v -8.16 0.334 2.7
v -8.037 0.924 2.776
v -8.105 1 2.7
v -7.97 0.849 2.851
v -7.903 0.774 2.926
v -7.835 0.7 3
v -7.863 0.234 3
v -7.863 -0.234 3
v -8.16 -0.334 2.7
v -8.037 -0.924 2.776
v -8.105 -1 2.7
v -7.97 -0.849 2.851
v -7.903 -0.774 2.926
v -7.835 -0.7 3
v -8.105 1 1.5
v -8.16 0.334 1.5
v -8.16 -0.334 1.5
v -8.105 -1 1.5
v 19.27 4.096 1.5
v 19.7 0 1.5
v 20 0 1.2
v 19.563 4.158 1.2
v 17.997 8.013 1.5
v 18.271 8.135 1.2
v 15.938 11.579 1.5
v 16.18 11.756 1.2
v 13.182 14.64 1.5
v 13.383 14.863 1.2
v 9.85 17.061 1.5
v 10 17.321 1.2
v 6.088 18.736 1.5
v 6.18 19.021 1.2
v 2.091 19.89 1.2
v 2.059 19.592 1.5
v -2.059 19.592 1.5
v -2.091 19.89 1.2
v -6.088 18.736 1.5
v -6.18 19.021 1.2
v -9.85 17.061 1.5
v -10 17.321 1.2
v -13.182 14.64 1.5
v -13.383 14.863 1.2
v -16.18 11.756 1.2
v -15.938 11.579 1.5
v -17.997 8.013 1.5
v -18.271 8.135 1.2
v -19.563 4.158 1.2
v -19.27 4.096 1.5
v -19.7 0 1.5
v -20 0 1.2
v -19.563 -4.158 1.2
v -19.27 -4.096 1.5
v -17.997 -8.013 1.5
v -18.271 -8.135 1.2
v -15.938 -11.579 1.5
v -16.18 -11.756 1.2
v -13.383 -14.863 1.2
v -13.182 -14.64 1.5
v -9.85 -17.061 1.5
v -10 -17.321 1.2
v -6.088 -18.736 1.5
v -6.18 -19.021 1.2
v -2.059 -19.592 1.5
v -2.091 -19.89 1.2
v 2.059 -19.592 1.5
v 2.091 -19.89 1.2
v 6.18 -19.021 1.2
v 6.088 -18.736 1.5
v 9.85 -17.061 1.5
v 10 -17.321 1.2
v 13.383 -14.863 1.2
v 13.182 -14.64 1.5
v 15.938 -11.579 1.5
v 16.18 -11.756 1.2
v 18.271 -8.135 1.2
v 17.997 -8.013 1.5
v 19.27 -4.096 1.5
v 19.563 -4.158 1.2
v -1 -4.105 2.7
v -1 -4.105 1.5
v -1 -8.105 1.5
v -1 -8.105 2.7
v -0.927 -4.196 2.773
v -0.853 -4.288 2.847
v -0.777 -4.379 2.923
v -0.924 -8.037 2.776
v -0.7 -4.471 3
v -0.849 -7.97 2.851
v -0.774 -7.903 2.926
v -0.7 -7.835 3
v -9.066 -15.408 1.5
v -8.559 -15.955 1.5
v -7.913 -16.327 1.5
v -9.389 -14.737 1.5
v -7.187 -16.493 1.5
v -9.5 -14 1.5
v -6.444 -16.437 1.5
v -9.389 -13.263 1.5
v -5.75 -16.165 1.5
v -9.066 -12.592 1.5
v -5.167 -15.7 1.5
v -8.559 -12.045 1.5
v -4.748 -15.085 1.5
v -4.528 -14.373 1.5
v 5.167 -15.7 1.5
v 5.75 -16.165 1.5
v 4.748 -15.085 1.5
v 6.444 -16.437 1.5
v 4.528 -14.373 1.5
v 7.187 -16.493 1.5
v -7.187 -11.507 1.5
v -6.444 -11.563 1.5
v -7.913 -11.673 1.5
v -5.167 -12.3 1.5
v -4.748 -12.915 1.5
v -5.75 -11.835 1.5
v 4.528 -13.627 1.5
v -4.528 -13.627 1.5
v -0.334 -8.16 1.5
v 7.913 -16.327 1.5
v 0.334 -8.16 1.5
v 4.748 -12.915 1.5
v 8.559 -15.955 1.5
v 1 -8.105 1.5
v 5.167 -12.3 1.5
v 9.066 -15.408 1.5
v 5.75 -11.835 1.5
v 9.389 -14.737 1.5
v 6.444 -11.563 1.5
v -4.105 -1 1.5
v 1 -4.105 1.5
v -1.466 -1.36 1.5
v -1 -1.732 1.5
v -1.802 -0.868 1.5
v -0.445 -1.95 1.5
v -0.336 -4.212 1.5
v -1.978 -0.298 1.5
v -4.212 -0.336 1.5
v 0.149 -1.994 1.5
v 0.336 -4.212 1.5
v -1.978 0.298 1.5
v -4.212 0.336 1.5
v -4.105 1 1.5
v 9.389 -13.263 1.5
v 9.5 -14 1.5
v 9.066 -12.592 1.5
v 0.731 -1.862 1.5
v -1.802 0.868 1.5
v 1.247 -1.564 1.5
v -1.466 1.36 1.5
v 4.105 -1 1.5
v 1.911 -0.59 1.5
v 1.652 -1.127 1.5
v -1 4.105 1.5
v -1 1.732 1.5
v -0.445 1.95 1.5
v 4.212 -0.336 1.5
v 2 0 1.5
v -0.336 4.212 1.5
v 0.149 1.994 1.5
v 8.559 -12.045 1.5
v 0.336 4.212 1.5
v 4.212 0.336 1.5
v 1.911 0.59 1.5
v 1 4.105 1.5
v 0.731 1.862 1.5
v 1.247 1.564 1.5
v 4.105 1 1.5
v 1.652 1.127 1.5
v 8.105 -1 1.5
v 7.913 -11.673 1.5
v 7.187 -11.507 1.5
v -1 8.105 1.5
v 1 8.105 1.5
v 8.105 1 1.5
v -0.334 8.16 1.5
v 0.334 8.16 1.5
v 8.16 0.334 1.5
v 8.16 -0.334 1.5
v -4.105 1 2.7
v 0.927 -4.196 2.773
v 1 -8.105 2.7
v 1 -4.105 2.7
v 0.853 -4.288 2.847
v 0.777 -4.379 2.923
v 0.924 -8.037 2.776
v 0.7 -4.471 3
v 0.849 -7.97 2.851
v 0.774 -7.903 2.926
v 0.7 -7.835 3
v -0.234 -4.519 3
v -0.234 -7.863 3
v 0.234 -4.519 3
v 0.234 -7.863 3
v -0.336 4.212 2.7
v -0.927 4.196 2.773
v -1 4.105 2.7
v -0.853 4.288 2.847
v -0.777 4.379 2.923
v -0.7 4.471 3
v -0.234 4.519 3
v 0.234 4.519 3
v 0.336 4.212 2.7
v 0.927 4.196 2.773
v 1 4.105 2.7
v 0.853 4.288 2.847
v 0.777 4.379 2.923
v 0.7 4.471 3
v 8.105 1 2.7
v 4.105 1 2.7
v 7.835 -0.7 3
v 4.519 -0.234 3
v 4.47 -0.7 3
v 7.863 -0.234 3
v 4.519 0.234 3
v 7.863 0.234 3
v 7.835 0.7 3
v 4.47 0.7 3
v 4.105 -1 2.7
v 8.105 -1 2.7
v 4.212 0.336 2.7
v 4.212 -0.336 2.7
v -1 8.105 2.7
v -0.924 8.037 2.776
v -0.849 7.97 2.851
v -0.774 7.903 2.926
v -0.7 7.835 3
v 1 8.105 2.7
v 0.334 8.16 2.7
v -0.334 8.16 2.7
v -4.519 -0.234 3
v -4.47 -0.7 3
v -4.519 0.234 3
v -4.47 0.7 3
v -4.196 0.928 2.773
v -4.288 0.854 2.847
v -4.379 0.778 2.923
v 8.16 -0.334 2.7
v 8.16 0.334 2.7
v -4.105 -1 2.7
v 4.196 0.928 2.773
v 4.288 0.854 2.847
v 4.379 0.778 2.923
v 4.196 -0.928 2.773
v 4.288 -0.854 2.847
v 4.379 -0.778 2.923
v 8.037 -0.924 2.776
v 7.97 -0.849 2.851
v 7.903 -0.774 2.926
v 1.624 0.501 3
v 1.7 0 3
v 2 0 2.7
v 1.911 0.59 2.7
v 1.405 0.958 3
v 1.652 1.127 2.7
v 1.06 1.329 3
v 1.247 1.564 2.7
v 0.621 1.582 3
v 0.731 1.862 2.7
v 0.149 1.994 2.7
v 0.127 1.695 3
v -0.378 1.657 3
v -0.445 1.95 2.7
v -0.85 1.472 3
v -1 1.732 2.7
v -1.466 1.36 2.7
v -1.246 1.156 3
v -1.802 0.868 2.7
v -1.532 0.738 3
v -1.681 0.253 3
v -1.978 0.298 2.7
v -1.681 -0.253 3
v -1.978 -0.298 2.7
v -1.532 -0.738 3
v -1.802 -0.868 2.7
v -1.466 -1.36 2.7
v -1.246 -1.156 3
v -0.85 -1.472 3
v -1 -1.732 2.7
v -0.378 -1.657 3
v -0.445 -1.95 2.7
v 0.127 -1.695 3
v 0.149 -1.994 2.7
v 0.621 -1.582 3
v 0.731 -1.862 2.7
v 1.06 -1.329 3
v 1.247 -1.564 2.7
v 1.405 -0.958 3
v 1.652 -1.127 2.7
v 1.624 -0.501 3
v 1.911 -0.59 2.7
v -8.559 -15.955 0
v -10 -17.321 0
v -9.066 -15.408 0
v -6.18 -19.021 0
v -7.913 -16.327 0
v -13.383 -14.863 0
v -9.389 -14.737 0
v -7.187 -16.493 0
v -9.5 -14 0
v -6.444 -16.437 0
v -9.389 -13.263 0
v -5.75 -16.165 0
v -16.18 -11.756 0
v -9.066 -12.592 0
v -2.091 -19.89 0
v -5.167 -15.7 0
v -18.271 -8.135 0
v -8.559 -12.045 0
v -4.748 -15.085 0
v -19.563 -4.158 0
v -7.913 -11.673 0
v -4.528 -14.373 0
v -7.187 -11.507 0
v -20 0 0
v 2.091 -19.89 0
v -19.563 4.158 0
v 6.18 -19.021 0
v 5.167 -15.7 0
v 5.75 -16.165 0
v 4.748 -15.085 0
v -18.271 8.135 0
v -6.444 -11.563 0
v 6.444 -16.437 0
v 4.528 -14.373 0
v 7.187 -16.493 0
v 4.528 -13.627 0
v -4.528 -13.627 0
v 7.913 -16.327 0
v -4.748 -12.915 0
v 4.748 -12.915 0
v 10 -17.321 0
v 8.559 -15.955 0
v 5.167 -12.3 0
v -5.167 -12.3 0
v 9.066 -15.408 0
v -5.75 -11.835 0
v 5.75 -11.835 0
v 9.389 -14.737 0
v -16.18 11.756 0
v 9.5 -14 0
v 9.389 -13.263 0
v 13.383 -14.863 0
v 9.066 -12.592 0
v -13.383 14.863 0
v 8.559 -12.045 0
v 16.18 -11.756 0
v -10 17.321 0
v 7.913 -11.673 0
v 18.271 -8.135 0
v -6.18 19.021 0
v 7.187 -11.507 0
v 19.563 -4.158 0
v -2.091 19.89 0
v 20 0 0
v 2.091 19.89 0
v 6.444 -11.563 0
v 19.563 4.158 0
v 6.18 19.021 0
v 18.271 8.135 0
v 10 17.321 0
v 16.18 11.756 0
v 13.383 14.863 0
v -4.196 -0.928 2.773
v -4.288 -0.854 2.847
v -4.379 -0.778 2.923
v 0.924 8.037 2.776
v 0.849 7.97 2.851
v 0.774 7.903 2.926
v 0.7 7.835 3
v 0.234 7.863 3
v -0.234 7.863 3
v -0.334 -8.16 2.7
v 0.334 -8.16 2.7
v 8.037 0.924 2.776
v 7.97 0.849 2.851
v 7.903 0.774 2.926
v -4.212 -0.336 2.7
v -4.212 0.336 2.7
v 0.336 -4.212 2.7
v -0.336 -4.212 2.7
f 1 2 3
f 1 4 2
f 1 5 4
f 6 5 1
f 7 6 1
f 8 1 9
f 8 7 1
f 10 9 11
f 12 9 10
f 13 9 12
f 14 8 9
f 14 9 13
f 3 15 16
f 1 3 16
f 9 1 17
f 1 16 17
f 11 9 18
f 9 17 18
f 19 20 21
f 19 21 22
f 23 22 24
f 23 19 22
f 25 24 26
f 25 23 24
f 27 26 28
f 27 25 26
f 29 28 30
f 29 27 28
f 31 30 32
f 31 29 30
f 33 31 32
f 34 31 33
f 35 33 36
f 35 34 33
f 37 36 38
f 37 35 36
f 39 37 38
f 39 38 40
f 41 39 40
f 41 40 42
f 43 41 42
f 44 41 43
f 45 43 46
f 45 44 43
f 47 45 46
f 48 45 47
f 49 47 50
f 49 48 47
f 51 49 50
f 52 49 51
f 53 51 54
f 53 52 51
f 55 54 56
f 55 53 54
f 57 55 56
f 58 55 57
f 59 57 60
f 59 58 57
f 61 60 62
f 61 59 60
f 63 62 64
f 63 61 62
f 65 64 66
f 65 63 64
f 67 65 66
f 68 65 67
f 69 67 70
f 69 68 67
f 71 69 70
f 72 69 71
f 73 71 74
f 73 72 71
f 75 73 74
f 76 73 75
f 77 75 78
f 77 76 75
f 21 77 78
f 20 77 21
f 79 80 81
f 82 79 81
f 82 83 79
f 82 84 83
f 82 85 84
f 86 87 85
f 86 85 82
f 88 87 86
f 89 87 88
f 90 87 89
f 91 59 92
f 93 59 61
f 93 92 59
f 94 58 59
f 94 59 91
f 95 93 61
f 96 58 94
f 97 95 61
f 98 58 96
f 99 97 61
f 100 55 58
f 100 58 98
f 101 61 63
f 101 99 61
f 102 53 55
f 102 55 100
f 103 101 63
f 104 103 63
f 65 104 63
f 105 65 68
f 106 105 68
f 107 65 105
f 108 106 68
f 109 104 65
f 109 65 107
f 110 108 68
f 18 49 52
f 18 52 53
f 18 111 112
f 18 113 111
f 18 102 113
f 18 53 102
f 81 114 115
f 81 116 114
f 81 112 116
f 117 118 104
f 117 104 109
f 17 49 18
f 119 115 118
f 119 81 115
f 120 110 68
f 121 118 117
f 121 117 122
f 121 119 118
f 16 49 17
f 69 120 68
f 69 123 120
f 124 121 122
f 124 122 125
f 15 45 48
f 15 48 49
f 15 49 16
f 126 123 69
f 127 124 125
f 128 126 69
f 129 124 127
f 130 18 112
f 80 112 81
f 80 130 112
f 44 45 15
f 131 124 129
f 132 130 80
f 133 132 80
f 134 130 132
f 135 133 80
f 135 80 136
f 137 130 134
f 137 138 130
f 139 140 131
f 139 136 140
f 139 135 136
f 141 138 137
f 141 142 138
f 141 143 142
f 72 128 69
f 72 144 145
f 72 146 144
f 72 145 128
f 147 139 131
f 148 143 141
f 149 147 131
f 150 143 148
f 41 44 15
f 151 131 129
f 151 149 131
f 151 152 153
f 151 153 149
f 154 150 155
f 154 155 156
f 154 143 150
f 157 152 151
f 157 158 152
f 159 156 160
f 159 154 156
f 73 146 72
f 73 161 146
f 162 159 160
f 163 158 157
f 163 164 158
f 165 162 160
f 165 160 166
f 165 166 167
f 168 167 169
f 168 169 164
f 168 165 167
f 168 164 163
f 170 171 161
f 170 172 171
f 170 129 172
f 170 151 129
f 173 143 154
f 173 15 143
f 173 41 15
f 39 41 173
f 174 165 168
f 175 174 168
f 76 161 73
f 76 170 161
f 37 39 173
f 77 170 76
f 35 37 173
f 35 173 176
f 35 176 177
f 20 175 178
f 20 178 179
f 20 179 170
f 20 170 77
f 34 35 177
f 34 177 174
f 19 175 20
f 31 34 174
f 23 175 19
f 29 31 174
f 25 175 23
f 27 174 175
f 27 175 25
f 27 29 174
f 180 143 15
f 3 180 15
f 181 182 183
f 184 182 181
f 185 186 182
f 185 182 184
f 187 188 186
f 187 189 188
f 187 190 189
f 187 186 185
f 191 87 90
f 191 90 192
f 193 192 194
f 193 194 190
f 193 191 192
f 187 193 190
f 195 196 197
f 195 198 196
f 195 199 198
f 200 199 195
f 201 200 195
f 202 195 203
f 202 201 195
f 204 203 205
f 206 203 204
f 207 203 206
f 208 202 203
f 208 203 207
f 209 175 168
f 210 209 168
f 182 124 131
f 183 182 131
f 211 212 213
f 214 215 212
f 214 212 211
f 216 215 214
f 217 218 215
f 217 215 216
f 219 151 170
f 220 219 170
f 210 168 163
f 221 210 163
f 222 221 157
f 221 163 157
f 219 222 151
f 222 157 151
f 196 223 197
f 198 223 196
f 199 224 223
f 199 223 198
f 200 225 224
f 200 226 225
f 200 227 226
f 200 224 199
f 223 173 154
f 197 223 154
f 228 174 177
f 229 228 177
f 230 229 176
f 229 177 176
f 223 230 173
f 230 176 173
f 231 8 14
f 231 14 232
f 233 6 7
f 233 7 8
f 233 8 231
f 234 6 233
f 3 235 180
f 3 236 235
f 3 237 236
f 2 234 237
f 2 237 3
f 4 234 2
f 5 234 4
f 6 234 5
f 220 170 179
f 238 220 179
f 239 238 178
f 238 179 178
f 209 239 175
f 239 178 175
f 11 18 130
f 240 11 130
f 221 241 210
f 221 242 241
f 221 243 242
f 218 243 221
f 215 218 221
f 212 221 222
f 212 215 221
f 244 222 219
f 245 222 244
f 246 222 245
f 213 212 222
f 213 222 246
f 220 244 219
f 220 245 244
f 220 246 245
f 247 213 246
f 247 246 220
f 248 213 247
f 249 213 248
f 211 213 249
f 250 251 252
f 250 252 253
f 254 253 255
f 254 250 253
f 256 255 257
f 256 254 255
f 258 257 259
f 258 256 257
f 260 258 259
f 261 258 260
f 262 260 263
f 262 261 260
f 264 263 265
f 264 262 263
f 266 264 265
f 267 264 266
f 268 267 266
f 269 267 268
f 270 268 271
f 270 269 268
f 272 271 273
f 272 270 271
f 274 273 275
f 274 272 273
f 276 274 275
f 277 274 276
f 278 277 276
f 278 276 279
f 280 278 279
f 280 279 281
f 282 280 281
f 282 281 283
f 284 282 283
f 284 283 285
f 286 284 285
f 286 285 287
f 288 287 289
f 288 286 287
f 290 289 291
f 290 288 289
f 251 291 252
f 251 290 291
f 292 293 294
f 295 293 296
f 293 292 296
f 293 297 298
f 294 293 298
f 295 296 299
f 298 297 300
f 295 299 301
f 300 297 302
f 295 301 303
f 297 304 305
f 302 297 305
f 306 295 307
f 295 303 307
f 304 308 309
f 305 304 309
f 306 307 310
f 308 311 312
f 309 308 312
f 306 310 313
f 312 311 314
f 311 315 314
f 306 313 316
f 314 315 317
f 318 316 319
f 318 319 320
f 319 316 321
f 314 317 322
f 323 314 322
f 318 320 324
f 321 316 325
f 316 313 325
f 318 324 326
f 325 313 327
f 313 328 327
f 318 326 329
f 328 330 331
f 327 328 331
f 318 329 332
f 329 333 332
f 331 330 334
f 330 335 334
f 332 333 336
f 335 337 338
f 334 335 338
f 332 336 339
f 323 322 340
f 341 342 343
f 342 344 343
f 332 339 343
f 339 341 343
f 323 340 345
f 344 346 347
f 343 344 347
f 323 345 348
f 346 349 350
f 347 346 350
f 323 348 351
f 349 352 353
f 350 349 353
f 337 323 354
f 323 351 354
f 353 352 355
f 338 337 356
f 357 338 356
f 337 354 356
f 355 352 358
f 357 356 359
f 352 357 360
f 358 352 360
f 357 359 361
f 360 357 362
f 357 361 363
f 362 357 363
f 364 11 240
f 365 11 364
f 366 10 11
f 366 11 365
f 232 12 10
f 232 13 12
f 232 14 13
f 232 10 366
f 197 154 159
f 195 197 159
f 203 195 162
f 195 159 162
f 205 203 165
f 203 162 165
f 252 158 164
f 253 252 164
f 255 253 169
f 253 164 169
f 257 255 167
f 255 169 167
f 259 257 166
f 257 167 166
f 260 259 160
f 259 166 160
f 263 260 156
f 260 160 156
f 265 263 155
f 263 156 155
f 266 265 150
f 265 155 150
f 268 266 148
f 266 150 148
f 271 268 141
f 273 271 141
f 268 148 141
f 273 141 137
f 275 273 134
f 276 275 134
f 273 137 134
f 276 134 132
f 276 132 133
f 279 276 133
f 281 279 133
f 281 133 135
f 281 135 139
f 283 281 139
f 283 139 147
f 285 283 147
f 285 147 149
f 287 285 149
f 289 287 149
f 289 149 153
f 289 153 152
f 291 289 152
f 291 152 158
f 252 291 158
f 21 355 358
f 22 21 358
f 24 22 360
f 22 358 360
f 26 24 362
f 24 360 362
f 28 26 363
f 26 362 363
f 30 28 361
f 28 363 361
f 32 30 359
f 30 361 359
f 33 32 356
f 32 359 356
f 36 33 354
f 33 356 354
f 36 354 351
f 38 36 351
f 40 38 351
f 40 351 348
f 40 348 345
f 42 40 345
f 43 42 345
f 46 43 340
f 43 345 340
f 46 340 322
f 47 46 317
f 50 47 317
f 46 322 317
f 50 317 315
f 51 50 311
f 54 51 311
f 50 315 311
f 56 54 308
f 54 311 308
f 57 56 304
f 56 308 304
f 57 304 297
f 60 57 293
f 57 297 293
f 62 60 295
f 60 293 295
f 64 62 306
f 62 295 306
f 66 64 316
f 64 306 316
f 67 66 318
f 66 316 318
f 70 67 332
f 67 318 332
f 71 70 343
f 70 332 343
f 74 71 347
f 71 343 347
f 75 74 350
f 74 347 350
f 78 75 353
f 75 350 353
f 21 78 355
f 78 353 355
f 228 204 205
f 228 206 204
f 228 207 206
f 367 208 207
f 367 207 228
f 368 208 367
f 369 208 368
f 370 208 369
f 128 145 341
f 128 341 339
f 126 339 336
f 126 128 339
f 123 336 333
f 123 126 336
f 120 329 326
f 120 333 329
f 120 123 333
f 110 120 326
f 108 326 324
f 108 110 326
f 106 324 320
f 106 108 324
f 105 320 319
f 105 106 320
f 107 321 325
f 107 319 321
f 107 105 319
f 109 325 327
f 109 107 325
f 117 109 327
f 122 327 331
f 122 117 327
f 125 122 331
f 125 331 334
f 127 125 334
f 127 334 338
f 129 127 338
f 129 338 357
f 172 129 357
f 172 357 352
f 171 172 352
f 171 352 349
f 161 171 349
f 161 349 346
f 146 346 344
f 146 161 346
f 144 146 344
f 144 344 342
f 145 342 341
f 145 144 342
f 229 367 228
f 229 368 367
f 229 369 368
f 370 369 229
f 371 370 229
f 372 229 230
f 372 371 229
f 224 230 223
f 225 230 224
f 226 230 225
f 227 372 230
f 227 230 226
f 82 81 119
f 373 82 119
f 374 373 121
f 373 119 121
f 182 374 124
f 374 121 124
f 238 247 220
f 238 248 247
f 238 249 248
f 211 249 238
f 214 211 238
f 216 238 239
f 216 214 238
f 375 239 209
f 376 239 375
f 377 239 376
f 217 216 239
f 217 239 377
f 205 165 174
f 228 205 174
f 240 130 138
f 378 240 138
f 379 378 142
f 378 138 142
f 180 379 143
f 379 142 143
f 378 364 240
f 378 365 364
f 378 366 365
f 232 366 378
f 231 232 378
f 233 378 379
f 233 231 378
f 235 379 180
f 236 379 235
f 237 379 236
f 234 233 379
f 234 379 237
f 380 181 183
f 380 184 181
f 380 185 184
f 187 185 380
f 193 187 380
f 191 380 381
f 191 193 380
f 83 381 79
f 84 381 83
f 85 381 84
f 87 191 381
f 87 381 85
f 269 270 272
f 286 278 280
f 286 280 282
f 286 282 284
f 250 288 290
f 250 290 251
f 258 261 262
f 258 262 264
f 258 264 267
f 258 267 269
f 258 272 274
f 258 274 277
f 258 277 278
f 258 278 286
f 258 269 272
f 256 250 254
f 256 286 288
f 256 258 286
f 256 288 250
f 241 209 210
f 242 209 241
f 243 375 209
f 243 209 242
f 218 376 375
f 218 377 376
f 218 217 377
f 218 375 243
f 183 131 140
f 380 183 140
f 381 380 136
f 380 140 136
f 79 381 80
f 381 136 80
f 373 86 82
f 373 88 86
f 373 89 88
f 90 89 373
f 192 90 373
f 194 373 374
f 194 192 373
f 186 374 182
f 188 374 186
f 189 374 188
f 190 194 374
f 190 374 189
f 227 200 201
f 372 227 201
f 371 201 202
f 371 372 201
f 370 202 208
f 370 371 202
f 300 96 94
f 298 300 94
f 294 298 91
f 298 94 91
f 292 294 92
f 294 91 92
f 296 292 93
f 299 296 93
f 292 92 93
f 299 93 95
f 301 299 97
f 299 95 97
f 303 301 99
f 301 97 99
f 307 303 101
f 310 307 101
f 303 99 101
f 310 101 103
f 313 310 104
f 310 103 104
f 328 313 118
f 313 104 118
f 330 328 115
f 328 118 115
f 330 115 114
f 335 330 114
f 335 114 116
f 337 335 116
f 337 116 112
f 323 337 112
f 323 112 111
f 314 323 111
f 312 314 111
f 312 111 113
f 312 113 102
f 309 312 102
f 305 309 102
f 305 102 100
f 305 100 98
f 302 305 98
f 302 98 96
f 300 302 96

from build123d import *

# Parameters (mm, degrees)
F0_R     = 20
F1_DEPTH = 1.5
F2_D     = 5
F2_DEPTH = 20.381
F2_TIP   = 1.5021515476
F3_R     = 2
F4_DEPTH = 3
F5_SIZE  = 0.3


# Not quite as in the source:
# - a pattern or mirror of a feature is missing from the dataset's text; its kind, count and spacing are read off the source's solid


with BuildPart() as f1:
    # F0 (on Top) → F1 (new body)
    with BuildSketch(Plane.XY):
        Circle(F0_R)
    extrude(amount=F1_DEPTH)

    # F2
    with Locations(Plane(origin=(0, 0, 0), x_dir=(1, 0, 0), z_dir=(0, 0, -1))):
        with Locations((-7, 14)):
            f2 = Hole(F2_D / 2, depth=F2_DEPTH)
            with Locations((0, 0, -(F2_DEPTH + F2_TIP / 2))):  # 118° drill point
                Cone(0, F2_D / 2, F2_TIP, mode=Mode.SUBTRACT)

    # F2_copies: F2 across plane
    add(f2.mirror(Plane(origin=(0, 0, 0), x_dir=(0, 0, 1), z_dir=(1, 0, 0))), mode=Mode.SUBTRACT)

    # F3 (on Top) → F4 (join)
    with BuildSketch(Plane.XY):
        with BuildLine():
            Line((-4.104842454, 1.0004466142), (-8.104842454, 1.0004466142))
            ThreePointArc((-8.104842454, 1.0004466142), (-8.1663556518, 0), (-8.104842454, -1.0004466142))
            Line((-8.104842454, -1.0004466142), (-4.104842454, -1.0004466142))
            ThreePointArc((-4.104842454, -1.0004466142), (-4.225, 0), (-4.104842454, 1.0004466142))
        make_face()
        with BuildLine():
            ThreePointArc((1, 8.1048975707), (0, 8.1663556518), (-1, 8.1048975707))
            Line((-1, 8.1048975707), (-1, 4.1049512786))
            ThreePointArc((-1, 4.1049512786), (0, 4.225), (1, 4.1049512786))
            Line((1, 4.1049512786), (1, 8.1048975707))
        make_face()
        with BuildLine():
            Line((4.104842454, -1.0004466142), (8.104842454, -1.0004466142))
            ThreePointArc((8.104842454, -1.0004466142), (8.1663556518, 0), (8.104842454, 1.0004466142))
            Line((8.104842454, 1.0004466142), (4.104842454, 1.0004466142))
            ThreePointArc((4.104842454, 1.0004466142), (4.225, 0), (4.104842454, -1.0004466142))
        make_face()
        with BuildLine():
            ThreePointArc((-1, -8.1048975707), (0, -8.1663556518), (1, -8.1048975707))
            Line((1, -8.1048975707), (1, -4.1049512786))
            ThreePointArc((1, -4.1049512786), (0, -4.225), (-1, -4.1049512786))
            Line((-1, -4.1049512786), (-1, -8.1048975707))
        make_face()
        Circle(F3_R)
    extrude(amount=F4_DEPTH)

    # F5
    f5_edges = [f1.edges().sort_by_distance(p)[0] for p in [
        (-2, 0, 3),
        (0, 8.166356, 3),
        (-1, 6.104924, 3),
        (0, 4.225, 3),
        (1, 6.104924, 3),
        (6.104842, -1.000447, 3),
        (8.166356, 0, 3),
        (6.104842, 1.000447, 3),
        (4.225, 0, 3),
        (1, -6.104924, 3),
        (0, -4.225, 3),
        (-1, -6.104924, 3),
        (0, -8.166356, 3),
        (-6.104842, 1.000447, 3),
        (-8.166356, 0, 3),
        (-6.104842, -1.000447, 3),
        (-4.225, 0, 3),
        (-20, 0, 1.5),
    ]]
    chamfer(f5_edges, length=F5_SIZE)


solid = f1.part
